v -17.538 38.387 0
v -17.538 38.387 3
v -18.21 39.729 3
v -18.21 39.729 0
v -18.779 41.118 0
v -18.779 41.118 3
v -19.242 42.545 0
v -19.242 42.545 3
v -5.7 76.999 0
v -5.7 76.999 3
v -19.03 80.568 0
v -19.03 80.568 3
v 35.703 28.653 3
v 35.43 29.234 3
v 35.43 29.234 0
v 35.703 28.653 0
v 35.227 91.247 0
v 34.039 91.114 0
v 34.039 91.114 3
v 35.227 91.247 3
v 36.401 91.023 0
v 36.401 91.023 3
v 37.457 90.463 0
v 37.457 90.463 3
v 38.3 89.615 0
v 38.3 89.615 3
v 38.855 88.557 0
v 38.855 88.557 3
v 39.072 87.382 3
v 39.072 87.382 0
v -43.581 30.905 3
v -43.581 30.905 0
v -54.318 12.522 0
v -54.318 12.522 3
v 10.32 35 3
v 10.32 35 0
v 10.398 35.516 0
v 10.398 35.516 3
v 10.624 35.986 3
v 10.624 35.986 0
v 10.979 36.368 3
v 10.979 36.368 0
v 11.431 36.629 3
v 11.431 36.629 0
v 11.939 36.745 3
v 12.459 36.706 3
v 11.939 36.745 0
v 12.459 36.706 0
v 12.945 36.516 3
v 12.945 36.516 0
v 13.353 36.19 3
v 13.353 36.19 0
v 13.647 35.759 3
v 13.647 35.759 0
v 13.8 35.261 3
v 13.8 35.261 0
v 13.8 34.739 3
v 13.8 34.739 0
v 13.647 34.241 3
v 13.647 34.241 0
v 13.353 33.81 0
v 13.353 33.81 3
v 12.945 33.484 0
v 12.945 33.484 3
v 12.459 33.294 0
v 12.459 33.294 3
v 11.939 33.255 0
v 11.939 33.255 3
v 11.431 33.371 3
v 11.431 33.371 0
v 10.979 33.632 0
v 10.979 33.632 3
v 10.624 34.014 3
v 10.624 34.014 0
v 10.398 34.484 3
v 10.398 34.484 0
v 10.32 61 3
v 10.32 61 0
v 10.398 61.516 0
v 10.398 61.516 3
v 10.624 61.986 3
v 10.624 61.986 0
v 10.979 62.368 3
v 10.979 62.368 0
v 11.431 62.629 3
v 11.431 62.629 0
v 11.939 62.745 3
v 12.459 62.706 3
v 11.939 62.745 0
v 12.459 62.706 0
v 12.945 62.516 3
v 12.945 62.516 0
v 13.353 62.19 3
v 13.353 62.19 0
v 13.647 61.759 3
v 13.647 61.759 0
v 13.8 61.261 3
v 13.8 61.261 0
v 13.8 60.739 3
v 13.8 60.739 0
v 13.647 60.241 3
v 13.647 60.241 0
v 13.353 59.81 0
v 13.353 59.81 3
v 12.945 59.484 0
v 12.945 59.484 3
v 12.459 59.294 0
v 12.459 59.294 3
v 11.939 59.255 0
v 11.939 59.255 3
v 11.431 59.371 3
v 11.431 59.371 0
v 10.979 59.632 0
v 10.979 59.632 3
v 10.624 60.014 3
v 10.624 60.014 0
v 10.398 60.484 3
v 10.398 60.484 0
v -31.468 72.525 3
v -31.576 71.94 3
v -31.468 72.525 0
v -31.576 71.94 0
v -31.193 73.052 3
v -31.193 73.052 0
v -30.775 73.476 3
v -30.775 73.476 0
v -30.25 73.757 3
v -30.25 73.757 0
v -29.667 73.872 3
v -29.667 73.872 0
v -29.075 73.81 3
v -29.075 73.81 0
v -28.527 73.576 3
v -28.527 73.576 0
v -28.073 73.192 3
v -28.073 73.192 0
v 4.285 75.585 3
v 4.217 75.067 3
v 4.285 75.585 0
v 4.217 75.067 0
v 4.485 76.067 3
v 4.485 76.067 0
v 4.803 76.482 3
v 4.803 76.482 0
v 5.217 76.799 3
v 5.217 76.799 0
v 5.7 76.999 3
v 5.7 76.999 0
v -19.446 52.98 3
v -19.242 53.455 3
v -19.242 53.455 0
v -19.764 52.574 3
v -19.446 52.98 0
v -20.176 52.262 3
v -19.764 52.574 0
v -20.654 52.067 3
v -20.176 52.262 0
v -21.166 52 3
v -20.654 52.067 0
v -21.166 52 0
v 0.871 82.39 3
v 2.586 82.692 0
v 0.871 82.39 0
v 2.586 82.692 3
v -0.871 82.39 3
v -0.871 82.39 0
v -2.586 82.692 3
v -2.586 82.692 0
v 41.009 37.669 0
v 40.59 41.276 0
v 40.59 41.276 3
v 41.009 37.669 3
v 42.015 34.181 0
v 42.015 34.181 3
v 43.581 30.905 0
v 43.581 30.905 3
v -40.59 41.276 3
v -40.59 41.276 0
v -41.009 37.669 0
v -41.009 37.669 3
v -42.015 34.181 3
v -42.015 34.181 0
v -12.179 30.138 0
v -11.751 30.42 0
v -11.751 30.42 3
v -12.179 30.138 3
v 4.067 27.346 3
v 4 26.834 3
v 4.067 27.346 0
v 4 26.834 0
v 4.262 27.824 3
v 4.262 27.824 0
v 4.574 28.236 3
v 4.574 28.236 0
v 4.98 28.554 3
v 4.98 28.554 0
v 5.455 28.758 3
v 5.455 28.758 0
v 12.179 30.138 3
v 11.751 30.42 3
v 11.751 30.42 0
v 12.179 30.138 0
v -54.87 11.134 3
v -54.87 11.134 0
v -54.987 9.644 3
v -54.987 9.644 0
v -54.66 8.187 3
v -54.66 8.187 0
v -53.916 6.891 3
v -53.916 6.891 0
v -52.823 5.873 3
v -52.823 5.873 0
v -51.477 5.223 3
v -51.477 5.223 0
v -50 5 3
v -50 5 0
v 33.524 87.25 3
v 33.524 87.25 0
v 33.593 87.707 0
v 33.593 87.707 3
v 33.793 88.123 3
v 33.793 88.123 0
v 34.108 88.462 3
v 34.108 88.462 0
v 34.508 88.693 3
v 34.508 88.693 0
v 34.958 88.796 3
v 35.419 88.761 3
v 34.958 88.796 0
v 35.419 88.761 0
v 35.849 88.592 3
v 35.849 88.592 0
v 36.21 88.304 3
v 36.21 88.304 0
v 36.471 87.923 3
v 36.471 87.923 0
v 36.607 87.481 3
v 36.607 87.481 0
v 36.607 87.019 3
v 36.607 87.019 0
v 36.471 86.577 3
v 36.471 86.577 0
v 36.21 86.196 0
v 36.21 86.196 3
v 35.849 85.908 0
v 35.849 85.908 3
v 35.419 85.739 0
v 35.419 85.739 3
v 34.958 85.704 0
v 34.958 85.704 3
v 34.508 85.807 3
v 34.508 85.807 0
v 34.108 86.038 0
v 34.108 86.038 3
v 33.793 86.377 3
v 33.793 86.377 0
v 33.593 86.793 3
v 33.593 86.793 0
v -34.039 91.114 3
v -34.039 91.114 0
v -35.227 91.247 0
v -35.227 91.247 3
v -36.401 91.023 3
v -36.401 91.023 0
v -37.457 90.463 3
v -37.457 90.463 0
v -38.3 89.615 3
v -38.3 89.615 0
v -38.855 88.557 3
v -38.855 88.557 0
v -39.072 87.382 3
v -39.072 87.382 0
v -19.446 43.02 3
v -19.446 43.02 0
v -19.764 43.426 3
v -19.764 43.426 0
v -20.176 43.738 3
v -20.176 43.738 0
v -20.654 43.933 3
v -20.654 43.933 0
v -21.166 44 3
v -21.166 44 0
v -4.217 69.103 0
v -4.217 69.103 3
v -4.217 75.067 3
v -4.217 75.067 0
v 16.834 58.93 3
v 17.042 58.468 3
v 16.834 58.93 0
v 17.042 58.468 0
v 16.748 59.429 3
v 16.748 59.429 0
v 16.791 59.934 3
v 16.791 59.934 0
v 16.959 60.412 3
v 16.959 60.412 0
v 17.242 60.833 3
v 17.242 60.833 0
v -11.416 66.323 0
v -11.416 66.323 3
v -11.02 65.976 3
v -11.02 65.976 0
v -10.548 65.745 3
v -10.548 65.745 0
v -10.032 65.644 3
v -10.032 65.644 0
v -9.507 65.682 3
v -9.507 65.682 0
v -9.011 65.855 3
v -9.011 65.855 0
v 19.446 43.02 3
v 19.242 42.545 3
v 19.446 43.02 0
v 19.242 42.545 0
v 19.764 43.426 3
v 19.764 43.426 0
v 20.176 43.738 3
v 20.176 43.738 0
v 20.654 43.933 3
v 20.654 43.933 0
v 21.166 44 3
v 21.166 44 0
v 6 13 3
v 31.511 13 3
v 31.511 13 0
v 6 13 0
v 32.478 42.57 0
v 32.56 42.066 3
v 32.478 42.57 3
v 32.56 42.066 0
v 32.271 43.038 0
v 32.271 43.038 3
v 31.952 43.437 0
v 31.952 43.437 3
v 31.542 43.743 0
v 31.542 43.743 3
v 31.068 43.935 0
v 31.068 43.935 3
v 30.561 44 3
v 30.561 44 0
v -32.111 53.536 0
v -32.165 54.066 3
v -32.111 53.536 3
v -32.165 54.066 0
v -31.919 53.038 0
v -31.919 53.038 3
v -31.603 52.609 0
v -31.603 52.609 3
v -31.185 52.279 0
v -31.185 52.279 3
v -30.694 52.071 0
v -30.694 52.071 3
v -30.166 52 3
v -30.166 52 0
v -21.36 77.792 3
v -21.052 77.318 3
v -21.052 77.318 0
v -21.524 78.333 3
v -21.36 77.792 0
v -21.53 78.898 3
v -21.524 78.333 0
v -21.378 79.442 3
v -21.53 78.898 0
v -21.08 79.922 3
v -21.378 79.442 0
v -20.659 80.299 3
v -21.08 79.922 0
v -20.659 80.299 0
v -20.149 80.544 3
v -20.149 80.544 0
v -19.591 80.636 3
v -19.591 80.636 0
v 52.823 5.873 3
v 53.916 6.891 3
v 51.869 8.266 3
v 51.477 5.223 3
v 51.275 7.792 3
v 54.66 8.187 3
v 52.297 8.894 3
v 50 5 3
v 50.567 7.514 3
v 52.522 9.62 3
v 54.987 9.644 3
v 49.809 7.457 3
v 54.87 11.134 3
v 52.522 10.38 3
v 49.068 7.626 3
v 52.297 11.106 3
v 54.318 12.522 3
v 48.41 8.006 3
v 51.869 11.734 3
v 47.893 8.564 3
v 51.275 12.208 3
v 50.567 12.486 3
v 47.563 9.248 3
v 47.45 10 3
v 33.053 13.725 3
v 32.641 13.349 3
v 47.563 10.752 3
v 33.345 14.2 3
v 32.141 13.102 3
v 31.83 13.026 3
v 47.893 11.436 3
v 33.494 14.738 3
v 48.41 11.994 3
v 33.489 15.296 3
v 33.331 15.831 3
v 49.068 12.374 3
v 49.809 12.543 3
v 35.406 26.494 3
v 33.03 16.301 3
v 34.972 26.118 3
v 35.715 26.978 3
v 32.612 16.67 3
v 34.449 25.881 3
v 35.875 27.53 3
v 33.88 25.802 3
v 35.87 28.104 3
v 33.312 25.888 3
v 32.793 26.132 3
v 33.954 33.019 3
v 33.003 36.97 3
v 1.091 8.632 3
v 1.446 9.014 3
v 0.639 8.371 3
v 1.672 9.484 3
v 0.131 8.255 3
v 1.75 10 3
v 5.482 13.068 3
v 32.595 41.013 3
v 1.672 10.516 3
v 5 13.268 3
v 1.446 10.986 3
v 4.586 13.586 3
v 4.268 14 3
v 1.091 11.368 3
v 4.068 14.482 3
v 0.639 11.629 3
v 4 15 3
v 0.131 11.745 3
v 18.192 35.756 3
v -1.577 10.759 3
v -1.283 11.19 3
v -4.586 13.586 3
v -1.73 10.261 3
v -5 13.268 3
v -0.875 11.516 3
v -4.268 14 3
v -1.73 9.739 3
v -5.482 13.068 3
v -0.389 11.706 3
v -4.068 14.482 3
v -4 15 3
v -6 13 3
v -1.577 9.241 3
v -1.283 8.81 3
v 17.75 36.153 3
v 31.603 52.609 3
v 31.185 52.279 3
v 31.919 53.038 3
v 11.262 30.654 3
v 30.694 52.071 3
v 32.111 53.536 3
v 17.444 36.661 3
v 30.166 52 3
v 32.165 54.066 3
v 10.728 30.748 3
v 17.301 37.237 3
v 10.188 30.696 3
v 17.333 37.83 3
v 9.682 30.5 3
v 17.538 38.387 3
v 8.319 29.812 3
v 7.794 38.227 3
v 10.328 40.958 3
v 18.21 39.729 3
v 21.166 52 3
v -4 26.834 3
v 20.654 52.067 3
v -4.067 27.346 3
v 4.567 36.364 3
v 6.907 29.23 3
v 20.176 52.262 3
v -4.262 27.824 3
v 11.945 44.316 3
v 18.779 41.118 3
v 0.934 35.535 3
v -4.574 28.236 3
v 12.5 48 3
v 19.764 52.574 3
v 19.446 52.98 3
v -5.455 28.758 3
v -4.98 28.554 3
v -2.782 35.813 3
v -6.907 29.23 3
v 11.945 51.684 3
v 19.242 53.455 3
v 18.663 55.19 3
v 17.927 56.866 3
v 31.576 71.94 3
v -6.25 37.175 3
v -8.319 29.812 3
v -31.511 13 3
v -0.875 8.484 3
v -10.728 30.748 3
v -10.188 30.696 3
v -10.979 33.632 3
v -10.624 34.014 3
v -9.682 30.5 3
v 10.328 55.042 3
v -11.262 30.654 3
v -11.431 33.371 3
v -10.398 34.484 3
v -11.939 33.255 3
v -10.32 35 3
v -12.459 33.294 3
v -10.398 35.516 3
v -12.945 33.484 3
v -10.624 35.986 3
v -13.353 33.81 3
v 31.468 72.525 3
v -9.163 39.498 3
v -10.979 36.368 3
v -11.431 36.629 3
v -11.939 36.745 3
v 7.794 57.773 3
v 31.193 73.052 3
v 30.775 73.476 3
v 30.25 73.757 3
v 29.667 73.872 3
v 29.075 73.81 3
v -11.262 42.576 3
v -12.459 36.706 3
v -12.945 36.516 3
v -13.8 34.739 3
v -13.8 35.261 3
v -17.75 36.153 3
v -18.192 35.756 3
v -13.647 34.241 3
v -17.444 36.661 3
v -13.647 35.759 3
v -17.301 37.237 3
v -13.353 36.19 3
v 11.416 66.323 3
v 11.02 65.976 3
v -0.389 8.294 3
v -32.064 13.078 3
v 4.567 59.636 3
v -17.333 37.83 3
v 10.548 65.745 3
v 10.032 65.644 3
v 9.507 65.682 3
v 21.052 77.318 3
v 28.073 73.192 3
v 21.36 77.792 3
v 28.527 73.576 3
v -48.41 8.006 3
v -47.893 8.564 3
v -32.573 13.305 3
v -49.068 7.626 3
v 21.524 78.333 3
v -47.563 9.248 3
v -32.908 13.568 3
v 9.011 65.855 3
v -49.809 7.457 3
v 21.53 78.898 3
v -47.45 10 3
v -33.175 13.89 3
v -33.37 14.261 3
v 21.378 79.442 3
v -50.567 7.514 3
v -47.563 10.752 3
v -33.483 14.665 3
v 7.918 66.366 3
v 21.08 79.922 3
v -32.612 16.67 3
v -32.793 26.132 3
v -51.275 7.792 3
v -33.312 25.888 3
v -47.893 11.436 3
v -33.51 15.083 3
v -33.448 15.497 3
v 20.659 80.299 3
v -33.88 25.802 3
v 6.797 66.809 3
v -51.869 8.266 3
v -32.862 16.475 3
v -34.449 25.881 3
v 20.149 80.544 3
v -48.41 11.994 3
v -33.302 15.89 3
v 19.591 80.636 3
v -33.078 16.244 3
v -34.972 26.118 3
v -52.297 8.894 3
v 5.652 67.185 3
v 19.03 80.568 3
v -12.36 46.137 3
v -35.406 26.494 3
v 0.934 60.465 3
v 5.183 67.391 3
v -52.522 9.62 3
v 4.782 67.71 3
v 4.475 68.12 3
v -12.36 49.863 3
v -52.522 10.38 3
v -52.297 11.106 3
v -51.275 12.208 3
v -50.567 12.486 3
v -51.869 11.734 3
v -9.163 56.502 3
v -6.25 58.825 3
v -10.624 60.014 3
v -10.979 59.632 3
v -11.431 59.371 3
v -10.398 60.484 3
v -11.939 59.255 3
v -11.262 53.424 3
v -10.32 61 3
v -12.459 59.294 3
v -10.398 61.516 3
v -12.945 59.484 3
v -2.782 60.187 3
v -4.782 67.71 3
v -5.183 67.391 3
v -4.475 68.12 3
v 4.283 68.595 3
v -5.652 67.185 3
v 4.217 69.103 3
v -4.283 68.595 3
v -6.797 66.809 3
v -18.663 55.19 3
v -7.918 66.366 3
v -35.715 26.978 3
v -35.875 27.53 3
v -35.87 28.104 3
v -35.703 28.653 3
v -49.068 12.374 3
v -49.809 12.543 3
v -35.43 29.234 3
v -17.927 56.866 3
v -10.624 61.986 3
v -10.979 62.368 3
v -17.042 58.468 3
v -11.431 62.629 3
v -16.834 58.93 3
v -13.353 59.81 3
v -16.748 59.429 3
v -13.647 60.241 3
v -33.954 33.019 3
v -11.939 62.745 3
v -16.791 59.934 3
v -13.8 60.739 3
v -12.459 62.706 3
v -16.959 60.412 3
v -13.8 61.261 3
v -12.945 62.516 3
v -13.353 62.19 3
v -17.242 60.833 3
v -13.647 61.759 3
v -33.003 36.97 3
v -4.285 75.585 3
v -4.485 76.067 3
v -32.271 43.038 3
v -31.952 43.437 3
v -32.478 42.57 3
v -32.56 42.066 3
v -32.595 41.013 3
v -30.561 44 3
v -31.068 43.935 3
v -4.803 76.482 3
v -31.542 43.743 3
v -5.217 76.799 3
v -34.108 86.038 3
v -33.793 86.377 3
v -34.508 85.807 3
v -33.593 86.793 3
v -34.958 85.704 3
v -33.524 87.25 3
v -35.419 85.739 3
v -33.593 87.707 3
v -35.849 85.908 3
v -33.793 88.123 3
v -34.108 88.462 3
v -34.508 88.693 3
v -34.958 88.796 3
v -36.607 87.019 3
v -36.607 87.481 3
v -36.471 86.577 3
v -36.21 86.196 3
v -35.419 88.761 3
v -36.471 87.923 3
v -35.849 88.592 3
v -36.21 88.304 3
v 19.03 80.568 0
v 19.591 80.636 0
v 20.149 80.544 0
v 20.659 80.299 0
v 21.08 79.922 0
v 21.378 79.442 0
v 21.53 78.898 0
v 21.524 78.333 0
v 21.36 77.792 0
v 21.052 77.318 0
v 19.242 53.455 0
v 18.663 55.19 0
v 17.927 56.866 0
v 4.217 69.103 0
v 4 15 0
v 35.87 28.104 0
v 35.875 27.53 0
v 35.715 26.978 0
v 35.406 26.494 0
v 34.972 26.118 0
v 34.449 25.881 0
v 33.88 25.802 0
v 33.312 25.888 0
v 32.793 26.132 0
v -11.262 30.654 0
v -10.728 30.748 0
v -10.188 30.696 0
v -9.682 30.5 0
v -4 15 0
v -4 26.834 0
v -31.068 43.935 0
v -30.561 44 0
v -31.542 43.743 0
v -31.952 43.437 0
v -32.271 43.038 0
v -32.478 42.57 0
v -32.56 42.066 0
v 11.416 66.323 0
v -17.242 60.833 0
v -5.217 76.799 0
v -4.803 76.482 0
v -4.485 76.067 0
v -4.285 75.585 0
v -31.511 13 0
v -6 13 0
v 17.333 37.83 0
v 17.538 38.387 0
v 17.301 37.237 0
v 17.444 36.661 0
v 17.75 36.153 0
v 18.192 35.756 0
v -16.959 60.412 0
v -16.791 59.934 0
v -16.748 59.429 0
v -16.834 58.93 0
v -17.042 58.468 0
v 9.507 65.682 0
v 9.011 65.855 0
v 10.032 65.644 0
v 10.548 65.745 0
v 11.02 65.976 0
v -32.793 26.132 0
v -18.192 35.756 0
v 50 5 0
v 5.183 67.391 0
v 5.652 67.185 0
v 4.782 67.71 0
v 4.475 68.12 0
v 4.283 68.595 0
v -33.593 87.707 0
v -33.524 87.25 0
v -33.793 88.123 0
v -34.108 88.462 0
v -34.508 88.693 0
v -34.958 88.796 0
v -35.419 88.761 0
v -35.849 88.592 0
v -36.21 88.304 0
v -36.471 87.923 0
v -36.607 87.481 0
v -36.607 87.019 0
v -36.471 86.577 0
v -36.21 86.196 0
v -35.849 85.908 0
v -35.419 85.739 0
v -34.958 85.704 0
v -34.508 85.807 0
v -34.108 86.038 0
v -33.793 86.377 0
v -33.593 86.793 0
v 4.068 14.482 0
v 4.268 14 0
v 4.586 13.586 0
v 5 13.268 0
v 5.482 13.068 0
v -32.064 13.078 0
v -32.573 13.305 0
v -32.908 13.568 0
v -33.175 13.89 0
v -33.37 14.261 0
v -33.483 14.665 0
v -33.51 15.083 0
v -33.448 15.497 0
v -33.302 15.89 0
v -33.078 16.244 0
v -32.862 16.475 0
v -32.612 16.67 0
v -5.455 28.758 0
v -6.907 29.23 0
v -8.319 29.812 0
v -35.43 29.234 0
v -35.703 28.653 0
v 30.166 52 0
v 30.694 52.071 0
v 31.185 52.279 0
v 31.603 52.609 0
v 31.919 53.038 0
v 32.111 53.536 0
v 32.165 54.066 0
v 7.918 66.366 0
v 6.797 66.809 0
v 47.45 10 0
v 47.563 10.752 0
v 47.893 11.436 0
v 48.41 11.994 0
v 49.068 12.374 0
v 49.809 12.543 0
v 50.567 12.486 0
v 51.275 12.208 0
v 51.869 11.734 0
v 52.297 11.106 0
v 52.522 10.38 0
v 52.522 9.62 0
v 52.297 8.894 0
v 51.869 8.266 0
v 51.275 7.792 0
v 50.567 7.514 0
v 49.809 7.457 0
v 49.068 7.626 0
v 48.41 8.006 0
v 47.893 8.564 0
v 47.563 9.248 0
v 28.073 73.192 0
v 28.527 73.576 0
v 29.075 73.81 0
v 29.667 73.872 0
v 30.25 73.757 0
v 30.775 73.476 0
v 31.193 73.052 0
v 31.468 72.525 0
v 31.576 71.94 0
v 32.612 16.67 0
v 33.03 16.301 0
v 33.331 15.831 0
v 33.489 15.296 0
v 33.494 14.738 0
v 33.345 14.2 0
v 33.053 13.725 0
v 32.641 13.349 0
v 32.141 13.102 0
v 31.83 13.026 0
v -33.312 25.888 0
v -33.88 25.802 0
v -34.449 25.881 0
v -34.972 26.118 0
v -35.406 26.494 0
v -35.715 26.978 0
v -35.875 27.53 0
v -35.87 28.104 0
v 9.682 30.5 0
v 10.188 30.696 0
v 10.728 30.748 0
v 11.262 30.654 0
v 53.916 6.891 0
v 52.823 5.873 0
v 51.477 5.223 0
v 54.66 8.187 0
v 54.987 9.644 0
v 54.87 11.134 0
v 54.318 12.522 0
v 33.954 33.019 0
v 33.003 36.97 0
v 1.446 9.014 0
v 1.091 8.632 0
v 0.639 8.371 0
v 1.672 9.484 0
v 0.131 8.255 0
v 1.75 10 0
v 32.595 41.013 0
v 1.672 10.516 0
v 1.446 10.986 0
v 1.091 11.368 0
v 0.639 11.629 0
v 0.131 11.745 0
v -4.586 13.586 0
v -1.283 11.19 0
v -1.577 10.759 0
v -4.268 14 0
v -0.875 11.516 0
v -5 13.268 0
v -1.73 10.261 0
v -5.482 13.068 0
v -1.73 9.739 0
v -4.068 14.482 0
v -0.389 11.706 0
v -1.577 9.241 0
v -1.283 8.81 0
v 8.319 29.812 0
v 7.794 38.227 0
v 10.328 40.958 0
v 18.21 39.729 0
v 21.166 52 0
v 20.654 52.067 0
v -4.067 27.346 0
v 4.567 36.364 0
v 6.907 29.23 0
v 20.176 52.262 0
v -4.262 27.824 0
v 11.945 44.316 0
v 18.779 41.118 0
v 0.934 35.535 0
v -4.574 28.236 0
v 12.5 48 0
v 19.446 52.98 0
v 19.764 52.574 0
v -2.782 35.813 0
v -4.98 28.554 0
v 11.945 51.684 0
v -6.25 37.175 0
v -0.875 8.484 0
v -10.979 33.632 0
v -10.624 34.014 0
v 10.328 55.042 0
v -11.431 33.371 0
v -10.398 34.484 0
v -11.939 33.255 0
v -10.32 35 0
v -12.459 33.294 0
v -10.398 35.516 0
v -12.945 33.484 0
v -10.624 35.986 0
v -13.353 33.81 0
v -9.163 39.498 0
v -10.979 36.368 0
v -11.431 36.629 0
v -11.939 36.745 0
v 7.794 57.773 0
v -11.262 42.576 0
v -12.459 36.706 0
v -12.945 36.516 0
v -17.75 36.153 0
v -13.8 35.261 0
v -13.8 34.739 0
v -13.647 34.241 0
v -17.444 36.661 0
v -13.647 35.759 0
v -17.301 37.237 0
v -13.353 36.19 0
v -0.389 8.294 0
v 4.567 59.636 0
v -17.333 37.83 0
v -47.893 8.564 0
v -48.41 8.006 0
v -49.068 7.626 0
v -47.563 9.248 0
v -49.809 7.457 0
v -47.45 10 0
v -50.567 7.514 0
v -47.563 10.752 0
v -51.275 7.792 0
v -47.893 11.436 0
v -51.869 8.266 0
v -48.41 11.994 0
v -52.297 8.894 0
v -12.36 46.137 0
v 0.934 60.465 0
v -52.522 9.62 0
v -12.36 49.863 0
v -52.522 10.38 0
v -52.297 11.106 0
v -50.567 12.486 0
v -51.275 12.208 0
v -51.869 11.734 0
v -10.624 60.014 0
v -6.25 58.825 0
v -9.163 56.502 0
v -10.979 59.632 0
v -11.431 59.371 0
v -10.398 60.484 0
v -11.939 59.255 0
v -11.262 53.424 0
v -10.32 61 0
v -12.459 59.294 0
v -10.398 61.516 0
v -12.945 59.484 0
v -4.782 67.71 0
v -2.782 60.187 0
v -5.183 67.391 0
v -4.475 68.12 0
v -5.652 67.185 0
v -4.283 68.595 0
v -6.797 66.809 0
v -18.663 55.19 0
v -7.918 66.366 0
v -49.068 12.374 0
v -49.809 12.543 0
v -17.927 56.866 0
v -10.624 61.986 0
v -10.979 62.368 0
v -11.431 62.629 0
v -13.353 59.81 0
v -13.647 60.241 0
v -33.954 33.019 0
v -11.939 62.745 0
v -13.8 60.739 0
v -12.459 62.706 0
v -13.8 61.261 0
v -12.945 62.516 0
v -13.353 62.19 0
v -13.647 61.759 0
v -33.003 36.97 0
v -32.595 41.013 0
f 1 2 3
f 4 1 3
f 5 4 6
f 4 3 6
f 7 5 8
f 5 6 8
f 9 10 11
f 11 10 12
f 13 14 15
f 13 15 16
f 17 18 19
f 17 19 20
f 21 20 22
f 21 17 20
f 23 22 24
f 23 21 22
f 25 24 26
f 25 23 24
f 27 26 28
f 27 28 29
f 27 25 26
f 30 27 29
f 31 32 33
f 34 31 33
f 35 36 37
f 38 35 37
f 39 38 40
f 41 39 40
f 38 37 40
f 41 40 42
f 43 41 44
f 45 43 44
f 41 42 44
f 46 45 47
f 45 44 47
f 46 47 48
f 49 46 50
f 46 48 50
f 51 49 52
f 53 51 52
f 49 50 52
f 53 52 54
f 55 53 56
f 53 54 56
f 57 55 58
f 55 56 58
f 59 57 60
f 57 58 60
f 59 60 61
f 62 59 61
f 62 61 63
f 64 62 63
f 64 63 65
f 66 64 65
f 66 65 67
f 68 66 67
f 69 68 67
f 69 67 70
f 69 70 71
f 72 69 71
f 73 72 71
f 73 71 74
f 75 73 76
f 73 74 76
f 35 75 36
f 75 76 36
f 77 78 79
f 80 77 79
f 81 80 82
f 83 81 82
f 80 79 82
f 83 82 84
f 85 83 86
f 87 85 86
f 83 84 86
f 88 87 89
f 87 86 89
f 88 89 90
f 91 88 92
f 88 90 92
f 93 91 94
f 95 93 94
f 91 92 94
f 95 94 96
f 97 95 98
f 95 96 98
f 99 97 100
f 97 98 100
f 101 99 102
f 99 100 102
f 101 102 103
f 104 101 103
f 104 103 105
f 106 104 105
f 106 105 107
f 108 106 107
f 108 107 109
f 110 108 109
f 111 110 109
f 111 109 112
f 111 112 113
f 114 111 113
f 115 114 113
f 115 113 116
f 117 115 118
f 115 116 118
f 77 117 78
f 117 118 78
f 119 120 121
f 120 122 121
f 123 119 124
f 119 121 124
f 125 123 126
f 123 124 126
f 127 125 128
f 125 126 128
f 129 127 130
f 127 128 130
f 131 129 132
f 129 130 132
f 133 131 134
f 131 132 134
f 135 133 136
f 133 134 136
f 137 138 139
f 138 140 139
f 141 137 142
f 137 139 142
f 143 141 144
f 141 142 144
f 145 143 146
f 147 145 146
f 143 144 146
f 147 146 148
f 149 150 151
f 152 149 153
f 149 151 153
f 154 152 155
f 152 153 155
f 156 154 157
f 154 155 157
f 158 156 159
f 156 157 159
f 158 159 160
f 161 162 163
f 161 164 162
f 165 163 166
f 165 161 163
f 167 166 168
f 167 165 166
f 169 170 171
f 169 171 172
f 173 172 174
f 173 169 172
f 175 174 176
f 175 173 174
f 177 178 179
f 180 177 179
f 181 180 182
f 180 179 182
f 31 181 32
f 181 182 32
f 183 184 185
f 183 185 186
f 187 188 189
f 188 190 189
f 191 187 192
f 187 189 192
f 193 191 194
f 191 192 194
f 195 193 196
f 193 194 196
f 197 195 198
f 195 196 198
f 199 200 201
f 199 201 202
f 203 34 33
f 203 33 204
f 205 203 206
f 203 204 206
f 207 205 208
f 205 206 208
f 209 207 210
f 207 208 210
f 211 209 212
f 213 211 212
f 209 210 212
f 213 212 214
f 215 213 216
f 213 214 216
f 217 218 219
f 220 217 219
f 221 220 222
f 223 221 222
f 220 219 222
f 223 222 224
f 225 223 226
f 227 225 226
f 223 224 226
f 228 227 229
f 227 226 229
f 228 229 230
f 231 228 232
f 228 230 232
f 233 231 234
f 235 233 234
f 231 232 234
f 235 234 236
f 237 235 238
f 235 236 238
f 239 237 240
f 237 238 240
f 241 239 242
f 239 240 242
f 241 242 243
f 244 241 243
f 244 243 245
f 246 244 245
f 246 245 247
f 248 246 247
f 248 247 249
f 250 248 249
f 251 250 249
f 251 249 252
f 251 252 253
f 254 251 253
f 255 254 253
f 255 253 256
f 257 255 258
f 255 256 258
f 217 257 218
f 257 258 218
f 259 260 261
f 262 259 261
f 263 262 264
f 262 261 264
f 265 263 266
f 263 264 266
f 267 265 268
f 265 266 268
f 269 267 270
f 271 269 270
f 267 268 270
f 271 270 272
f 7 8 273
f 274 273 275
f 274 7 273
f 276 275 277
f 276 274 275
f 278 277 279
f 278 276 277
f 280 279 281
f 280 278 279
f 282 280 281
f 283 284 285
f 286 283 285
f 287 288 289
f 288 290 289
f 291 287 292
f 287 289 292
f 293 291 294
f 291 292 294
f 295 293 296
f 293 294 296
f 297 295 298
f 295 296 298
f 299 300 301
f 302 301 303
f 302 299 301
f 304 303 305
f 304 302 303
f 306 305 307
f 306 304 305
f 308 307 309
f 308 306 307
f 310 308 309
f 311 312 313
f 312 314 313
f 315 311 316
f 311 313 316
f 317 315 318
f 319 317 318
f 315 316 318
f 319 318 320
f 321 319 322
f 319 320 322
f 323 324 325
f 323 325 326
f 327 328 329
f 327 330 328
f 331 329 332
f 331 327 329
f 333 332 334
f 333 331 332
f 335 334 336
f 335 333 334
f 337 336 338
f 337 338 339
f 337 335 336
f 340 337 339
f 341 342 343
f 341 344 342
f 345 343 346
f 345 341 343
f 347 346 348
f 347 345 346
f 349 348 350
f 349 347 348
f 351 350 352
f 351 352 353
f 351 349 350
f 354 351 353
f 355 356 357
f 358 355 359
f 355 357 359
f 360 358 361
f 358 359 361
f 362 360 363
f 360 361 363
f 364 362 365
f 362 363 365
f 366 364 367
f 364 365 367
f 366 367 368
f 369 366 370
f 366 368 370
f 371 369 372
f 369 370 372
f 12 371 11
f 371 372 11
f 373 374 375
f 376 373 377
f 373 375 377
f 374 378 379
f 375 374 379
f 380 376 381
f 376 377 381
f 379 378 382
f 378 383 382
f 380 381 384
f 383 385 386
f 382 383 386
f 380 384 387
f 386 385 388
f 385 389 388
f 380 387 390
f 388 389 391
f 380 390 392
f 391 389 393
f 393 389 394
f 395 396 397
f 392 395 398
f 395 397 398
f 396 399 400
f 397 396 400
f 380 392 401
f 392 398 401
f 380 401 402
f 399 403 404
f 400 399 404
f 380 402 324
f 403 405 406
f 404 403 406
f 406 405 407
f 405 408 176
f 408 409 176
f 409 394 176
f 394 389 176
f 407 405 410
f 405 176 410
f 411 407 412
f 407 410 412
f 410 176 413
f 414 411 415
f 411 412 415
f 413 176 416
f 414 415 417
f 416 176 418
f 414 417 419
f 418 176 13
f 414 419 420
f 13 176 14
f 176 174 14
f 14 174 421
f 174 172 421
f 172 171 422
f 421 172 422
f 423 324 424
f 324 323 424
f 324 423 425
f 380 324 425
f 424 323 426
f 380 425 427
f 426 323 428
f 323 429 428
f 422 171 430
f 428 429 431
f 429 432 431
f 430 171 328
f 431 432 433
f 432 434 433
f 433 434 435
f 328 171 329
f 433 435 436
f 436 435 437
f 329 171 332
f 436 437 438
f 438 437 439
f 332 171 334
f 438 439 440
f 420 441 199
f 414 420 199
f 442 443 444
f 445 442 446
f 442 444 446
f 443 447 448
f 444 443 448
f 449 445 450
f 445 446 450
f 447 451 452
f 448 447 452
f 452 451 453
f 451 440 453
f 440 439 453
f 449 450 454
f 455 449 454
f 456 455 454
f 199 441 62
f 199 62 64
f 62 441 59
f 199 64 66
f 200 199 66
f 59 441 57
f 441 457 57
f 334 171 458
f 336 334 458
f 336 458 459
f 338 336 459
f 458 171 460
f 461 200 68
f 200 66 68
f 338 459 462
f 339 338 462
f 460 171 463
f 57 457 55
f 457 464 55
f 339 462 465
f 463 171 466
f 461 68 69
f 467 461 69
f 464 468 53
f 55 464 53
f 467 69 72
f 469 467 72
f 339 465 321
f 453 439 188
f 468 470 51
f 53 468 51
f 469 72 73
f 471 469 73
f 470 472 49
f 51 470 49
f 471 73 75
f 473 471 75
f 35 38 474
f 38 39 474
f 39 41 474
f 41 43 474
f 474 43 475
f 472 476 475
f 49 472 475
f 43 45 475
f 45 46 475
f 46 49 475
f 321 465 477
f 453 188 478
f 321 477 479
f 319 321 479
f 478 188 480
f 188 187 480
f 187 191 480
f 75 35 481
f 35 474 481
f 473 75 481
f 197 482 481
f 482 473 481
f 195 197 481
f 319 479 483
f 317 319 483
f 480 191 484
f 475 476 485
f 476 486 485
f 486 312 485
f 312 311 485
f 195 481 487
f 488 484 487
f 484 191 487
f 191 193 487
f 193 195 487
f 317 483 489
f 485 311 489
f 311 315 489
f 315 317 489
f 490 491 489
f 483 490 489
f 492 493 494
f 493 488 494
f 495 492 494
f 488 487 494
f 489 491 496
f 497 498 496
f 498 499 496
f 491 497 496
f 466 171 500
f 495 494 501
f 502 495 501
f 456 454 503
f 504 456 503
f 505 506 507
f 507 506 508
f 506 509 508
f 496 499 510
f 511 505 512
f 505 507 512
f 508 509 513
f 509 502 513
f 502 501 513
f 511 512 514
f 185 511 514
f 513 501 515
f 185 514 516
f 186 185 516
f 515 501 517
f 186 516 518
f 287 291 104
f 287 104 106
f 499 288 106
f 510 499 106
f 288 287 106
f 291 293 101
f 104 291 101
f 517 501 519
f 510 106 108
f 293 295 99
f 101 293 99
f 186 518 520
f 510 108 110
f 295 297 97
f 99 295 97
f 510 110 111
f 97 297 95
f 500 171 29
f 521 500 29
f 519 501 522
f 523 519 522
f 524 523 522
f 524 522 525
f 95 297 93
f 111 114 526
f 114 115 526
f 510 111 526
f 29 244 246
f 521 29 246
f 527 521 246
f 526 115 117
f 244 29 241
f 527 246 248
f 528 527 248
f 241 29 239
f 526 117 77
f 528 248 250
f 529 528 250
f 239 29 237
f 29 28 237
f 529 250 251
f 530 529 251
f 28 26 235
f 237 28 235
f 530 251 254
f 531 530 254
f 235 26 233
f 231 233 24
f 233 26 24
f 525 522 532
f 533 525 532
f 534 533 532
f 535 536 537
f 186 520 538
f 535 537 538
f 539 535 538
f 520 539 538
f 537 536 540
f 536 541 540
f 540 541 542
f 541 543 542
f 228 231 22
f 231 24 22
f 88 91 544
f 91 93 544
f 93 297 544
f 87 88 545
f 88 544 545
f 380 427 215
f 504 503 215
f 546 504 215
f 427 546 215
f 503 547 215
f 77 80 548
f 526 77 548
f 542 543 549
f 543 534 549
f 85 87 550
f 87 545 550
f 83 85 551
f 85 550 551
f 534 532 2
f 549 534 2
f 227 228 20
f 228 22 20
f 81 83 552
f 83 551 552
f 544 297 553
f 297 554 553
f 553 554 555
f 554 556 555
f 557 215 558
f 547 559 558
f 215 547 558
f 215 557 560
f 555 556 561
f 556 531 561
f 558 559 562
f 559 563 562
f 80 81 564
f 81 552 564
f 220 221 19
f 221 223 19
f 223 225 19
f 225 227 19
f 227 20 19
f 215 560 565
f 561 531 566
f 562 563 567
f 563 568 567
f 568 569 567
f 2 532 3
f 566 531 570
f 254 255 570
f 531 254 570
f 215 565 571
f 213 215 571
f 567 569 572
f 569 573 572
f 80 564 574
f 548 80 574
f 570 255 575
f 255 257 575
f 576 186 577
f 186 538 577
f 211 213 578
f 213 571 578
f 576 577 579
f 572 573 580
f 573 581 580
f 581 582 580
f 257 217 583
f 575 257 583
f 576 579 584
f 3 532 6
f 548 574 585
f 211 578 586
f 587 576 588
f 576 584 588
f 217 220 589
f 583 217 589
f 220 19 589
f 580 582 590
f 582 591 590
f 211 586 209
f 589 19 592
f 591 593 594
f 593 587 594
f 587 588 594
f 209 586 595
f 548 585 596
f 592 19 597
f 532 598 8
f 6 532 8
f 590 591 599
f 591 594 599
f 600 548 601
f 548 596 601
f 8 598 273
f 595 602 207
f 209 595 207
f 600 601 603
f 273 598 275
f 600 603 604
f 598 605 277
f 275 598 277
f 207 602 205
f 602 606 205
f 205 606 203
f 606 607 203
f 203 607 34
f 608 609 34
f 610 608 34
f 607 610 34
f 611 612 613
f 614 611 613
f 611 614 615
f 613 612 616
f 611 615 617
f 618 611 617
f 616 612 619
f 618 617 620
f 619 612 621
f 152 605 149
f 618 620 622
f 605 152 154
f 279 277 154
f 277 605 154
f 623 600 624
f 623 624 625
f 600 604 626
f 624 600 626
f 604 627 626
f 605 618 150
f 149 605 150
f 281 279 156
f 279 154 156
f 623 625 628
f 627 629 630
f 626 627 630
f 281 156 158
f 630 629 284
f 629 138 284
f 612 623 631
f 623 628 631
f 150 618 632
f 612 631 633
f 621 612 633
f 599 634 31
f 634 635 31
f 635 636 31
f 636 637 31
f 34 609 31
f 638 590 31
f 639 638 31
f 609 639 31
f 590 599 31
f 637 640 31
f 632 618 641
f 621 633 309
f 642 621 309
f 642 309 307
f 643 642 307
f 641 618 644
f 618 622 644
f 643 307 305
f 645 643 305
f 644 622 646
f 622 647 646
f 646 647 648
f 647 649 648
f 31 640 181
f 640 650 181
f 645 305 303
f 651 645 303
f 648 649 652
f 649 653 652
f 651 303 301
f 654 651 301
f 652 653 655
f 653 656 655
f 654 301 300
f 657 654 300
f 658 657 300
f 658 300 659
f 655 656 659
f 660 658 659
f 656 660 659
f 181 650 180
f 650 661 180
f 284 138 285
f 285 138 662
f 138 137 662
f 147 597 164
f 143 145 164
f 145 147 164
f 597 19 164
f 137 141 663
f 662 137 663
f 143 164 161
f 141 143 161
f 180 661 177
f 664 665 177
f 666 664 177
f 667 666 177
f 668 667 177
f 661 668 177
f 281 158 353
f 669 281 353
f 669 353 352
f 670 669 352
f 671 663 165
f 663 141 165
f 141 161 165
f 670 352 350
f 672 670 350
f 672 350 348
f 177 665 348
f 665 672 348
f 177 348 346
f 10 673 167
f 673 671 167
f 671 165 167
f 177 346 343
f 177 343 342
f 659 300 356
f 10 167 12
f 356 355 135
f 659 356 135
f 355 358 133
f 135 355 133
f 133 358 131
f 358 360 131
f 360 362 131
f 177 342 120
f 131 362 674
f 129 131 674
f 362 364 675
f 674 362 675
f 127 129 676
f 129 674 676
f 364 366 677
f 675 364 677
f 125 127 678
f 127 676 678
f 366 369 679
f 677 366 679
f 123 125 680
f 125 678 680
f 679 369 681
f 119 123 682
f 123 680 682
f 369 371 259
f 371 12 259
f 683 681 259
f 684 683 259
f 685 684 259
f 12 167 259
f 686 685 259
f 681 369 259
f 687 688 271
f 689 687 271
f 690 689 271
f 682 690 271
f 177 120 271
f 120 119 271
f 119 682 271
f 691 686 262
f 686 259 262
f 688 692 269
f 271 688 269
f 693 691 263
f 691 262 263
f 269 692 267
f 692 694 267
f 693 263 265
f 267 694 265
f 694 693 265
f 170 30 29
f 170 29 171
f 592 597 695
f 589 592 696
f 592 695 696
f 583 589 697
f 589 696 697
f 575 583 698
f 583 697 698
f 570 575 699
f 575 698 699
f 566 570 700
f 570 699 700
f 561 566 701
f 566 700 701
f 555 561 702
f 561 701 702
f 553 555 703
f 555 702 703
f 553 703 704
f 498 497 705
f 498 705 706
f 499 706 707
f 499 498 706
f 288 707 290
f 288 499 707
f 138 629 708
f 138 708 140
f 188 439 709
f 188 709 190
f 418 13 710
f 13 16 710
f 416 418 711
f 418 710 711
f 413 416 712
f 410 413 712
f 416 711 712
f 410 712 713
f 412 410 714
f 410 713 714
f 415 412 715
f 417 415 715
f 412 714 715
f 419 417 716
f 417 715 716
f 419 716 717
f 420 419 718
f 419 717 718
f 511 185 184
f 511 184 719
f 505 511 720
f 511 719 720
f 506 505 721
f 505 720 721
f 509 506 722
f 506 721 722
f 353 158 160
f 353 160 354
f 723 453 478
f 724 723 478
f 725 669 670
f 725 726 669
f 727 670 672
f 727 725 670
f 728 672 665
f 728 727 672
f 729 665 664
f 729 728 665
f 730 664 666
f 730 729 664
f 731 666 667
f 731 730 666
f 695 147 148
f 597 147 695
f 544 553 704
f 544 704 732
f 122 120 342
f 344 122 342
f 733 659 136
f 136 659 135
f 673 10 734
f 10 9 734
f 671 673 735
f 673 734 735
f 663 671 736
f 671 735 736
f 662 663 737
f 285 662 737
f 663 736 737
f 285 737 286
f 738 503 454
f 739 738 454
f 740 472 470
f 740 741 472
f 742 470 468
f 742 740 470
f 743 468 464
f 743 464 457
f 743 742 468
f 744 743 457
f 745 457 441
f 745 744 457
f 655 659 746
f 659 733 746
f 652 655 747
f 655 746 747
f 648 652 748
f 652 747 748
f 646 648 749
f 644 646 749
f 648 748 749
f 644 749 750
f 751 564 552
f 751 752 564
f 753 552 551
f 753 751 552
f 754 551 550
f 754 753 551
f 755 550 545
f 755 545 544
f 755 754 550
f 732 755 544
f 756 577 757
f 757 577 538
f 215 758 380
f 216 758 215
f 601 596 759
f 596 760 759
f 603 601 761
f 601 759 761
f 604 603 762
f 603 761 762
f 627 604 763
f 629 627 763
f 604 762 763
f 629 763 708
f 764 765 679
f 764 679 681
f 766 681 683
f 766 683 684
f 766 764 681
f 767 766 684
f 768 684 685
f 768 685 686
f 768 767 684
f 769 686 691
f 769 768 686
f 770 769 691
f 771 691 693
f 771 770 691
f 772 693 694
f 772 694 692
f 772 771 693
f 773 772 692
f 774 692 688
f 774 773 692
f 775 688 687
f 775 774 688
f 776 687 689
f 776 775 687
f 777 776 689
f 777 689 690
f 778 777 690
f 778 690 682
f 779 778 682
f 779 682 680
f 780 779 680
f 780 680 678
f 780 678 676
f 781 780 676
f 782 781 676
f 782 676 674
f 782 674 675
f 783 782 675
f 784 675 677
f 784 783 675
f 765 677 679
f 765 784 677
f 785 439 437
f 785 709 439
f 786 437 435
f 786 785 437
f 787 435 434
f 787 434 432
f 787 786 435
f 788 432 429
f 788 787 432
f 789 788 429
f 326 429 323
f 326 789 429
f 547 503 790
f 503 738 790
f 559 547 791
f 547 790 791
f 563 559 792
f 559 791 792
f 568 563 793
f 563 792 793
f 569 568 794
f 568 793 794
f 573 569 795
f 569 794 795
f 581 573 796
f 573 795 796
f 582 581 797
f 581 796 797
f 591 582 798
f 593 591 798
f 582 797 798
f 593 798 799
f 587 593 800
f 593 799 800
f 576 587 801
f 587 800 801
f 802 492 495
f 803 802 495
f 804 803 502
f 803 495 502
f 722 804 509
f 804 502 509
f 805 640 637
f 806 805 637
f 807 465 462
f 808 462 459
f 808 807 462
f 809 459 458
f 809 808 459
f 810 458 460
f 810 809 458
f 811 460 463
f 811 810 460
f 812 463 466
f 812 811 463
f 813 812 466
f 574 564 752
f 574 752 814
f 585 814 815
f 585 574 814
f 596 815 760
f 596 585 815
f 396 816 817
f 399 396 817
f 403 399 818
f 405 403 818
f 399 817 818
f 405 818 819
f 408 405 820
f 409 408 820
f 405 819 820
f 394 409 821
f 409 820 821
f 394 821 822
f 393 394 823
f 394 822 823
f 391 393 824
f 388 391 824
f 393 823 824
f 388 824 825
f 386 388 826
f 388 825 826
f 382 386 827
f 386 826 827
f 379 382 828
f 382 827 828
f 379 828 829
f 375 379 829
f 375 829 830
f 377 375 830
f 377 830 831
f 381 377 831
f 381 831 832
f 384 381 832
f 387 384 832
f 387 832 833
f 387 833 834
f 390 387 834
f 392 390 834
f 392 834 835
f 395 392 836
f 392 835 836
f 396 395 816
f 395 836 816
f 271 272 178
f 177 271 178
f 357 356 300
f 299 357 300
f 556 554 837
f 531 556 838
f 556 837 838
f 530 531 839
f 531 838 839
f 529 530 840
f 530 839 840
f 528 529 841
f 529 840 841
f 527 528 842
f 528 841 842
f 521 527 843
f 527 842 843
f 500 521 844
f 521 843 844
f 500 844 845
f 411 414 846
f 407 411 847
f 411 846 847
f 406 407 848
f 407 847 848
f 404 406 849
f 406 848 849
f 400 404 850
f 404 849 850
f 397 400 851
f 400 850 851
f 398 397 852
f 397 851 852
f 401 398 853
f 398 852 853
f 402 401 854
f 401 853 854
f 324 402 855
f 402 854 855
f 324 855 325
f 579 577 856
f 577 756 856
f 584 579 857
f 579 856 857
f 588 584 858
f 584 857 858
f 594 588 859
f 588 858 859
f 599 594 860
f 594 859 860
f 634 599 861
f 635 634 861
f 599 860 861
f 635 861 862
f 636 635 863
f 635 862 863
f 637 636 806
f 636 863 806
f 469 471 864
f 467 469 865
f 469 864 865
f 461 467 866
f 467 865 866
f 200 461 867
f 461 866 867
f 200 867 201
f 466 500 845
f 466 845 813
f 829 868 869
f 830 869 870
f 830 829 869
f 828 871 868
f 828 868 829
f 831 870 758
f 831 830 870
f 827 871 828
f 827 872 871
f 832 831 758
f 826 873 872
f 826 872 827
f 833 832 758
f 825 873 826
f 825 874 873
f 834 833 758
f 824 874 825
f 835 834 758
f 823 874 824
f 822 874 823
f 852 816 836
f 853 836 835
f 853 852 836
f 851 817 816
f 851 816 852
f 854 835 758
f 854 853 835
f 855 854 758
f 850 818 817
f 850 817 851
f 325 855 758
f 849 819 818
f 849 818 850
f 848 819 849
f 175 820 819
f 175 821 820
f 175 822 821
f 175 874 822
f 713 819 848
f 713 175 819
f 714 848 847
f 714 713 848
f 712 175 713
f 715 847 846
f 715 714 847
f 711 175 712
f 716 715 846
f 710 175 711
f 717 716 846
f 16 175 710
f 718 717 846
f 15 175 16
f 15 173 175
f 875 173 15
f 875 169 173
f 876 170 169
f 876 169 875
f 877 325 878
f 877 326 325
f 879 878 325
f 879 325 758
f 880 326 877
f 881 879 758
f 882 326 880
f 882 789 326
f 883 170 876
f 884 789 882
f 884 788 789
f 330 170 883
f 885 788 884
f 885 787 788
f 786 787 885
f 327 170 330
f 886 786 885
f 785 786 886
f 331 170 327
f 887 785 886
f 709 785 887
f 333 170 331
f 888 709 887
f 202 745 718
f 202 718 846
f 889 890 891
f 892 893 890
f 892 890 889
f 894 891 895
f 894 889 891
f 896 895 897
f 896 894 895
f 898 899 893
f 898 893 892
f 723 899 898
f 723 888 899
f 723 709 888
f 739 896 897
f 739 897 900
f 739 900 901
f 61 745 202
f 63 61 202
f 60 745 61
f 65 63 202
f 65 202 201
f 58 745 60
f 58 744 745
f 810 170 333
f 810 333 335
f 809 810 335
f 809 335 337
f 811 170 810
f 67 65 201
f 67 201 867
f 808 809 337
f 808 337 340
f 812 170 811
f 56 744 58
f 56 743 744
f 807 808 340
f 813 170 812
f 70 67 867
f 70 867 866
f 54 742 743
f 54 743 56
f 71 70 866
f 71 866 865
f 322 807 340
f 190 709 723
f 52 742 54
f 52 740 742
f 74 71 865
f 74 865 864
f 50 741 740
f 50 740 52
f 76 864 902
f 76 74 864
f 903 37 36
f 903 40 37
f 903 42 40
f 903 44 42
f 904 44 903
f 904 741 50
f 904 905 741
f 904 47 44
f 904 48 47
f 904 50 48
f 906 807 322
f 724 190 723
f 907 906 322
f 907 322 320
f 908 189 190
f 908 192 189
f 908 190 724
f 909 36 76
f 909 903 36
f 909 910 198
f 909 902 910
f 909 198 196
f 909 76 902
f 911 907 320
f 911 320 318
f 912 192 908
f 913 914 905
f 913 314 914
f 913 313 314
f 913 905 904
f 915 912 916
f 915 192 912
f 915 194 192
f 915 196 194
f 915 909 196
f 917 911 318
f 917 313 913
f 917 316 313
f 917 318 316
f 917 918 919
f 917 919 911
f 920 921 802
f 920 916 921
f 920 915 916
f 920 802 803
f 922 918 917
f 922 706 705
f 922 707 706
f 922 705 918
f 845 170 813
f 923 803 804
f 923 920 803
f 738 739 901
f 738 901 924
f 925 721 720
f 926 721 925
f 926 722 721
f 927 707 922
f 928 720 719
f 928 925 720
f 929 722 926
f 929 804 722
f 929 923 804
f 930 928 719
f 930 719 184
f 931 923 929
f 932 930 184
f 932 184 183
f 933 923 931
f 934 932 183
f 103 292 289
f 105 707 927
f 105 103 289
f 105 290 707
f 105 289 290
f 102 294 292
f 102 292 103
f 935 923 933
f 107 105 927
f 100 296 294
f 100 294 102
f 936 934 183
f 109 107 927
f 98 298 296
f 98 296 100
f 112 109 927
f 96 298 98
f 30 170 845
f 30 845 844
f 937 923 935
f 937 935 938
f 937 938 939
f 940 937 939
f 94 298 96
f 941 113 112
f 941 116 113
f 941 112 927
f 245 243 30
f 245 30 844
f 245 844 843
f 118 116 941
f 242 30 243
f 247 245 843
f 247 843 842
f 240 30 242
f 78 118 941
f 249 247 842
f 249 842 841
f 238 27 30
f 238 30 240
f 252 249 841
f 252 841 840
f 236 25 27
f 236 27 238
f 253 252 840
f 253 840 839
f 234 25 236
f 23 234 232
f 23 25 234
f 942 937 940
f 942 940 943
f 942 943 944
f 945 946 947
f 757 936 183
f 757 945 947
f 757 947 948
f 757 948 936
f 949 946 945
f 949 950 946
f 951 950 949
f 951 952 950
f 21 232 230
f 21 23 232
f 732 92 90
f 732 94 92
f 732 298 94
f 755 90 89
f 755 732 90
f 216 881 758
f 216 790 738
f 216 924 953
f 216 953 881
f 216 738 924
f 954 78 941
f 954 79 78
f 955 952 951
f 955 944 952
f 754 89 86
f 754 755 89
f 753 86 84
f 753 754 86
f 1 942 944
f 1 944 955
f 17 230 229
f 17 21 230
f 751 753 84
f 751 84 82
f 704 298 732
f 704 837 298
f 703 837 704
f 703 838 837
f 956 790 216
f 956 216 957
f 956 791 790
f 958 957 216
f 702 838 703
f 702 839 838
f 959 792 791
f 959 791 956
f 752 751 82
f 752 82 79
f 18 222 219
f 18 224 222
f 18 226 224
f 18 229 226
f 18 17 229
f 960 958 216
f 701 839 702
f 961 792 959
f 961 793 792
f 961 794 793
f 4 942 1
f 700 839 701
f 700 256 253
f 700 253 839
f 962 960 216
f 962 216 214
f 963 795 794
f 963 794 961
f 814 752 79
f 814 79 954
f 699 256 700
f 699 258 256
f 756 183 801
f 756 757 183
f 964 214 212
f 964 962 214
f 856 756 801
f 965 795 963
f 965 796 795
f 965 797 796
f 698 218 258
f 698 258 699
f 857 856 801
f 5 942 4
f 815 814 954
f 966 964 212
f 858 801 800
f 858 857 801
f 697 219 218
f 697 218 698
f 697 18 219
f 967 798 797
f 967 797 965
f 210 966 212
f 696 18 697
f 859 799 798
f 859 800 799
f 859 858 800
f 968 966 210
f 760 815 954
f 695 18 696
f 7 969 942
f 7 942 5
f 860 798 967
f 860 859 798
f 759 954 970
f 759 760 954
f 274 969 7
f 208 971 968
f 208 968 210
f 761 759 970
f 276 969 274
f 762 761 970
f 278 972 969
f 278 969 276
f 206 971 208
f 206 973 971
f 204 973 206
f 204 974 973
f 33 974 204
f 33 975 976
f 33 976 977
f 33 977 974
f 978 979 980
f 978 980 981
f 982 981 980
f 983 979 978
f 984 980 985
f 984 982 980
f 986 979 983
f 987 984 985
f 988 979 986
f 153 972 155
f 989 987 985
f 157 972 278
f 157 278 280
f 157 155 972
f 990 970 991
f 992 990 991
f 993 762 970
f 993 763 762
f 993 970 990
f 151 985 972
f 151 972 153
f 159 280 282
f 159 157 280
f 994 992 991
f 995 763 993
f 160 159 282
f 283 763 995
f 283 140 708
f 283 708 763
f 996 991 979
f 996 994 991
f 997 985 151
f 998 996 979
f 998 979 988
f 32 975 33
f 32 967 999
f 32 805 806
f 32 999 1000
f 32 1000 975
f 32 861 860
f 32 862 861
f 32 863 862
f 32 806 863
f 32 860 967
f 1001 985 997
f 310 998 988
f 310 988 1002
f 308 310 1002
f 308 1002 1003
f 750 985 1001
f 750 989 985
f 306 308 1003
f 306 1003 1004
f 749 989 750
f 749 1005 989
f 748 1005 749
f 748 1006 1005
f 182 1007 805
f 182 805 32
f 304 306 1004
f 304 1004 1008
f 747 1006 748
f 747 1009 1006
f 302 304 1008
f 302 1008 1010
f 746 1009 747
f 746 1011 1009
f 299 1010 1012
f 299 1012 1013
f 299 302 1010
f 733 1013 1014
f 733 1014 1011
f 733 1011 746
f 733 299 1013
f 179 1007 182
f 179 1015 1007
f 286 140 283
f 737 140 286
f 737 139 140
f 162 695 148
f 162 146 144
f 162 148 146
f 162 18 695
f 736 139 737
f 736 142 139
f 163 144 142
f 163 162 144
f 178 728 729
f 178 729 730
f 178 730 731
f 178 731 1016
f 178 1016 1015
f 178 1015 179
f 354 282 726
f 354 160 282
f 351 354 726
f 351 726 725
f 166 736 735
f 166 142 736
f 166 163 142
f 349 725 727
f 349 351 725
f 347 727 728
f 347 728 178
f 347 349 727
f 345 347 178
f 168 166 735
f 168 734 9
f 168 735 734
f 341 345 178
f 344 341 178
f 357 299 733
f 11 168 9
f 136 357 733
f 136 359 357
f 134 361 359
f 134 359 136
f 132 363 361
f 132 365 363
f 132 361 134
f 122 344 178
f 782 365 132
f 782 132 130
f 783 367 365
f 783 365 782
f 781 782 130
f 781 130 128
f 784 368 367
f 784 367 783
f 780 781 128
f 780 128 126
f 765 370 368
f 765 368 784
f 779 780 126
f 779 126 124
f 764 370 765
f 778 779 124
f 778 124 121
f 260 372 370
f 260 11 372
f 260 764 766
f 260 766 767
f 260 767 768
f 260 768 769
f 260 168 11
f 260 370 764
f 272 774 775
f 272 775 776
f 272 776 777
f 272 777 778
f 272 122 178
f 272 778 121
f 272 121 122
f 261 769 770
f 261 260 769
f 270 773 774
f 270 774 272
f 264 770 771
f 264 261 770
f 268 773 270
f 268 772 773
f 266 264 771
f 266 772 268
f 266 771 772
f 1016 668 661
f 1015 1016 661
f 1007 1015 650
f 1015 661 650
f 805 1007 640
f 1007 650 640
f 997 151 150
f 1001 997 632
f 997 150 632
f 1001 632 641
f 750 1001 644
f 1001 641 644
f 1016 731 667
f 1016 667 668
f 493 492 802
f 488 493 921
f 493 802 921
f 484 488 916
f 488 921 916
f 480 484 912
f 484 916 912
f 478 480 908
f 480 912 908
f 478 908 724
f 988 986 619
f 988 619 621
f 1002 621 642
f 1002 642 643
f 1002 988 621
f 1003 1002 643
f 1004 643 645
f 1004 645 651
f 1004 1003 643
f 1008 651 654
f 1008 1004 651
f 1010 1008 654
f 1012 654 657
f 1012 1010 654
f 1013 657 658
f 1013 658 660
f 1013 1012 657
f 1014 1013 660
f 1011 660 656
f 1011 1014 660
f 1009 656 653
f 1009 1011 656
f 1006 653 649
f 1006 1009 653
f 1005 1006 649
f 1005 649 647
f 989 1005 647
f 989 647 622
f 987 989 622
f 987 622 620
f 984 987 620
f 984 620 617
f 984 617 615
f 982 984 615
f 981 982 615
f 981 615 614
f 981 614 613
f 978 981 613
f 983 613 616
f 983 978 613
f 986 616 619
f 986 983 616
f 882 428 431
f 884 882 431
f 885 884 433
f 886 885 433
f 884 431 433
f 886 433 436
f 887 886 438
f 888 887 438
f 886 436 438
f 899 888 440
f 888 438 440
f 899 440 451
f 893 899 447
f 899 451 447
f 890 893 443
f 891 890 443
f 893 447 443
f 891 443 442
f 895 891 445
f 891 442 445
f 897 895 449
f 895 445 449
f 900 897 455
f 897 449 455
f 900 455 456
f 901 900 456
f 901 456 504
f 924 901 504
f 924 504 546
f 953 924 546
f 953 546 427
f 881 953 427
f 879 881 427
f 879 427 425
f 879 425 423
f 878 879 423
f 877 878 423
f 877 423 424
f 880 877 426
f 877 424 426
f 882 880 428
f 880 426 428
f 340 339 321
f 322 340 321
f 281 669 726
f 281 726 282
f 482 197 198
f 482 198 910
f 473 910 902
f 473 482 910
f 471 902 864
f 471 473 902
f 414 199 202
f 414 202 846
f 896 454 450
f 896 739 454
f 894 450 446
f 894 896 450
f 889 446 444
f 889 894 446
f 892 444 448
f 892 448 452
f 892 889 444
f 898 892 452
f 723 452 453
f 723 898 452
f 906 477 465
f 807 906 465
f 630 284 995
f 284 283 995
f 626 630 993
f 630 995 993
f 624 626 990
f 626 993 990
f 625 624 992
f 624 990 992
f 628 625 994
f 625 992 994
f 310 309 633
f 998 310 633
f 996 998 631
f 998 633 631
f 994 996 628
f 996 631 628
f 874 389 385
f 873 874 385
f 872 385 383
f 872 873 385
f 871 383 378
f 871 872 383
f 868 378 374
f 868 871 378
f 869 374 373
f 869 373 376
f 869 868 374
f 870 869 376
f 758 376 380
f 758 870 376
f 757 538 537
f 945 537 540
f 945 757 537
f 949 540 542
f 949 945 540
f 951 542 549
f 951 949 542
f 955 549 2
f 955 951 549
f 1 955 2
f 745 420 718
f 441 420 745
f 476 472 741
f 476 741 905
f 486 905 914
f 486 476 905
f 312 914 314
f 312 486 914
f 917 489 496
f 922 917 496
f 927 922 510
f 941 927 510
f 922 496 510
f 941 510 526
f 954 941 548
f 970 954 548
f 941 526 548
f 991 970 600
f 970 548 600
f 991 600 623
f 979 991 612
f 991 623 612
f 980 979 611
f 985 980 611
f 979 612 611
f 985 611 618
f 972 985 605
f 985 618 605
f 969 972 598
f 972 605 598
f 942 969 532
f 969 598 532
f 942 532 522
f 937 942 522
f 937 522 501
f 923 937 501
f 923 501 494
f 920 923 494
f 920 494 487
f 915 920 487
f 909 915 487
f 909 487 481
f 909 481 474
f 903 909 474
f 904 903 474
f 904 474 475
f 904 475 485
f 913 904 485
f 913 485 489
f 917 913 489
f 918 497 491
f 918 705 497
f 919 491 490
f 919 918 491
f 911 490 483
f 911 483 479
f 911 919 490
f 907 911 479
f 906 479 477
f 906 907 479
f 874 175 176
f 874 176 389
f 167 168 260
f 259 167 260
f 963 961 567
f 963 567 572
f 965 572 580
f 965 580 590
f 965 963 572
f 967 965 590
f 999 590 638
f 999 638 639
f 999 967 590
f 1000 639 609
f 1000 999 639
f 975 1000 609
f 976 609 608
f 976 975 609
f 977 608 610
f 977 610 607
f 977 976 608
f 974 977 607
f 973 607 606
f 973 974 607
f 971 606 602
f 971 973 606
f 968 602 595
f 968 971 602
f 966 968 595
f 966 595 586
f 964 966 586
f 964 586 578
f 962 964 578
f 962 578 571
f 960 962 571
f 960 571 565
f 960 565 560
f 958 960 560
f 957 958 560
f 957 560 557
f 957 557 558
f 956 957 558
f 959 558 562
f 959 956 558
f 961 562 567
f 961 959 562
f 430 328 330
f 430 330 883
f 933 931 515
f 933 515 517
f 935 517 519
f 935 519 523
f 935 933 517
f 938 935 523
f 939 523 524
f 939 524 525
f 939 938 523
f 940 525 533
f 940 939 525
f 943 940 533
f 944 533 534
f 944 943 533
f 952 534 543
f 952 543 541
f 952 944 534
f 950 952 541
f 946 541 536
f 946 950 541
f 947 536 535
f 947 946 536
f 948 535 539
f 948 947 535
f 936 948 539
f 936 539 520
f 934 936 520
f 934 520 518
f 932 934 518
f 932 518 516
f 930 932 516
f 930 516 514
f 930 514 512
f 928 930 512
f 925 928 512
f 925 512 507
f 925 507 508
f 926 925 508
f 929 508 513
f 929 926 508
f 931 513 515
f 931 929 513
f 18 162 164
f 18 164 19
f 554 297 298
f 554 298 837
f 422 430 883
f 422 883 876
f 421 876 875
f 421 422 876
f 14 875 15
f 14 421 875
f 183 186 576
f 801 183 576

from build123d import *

# Parameters (mm, degrees)
SKETCH_1_R             = 1.75
SKETCH_1_R_2           = 4
SKETCH_1_R_3           = 1.55
SKETCH_1_R_4           = 5
SKETCH_1_R_5           = 2.55
EXTRUDE_1_DEPTH        = 3
FILLET_1_R             = 10
SKETCH_2_R             = 1.75
CUT_EXTRUDE_1_DEPTH    = 3
CUT_EXTRUDE_2_DEPTH    = 10
FILLET_2_R             = 2
FILLET_2_OF_MIRROR_2_R = 2
SKETCH_5_R             = 12.5
CUT_EXTRUDE_3_DEPTH    = 10
EXTRUDE_2_DEPTH        = 3
FILLET_3_R             = 2
FILLET_4_R             = 2


with BuildPart() as part:
    # 草图1 → 凸台-拉伸1 (new body)
    # profile 1 of 3: a face of its own
    with BuildSketch(Plane.XY):
        with BuildLine():
            ThreePointArc((-31.074028853, 87.25), (-35.139866152, 83.250541855), (-39.071861578, 87.38165676))
            Line((-39.071861578, 87.38165676), (-40.590218292, 41.27588782))
            ThreePointArc((-40.590218292, 41.27588782), (-41.439715326, 35.904074252), (-43.581025503, 30.904792609))
            Line((-43.581025503, 30.904792609), (-54.317561995, 12.521638043))
            ThreePointArc((-54.317561995, 12.521638043), (-48.693824279, 14.826375968), (-45, 10))
            ThreePointArc((-45, 10), (-46.464466094, 6.464466094), (-50, 5))
            Line((-50, 5), (0, 5))
            Line((0, 5), (0, 82))
            Line((0, 82), (-34.039489079, 91.113900549))
            ThreePointArc((-34.039489079, 91.113900549), (-31.900847556, 89.685348117), (-31.074028853, 87.25))
        make_face()
        with Locations((-12.07, 35)):
            Circle(SKETCH_1_R, mode=Mode.SUBTRACT)
        with Locations((-12.07, 61)):
            Circle(SKETCH_1_R, mode=Mode.SUBTRACT)
    # profile 2 of 3: a face of its own
    with BuildSketch(Plane.XY):
        with Locations((-35.074028853, 87.25)):
            Circle(SKETCH_1_R_2)
        with Locations((-35.074028853, 87.25)):
            Circle(SKETCH_1_R_3, mode=Mode.SUBTRACT)
    # profile 3 of 3: a face of its own
    with BuildSketch(Plane.XY):
        with Locations((-50, 10)):
            Circle(SKETCH_1_R_4)
        with Locations((-50, 10)):
            Circle(SKETCH_1_R_5, mode=Mode.SUBTRACT)
    extrude_1 = extrude(amount=EXTRUDE_1_DEPTH)

    # 镜向1: 凸台-拉伸1 across plane
    add(extrude_1.mirror(Plane(origin=(0, 0, 3), x_dir=(0, 0, 1), z_dir=(-1, 0, 0))))

    # 圆角1
    fillet_1_edges = [part.edges().sort_by_distance(p)[0] for p in [
        (0, 82, 1.5),
    ]]
    fillet(fillet_1_edges, radius=FILLET_1_R)

    # 草图2 → 切除-拉伸1 (cut)
    with BuildSketch(Plane.XY.offset(3)):
        with Locations((0, 10)):
            Circle(SKETCH_2_R)
    extrude(amount=-CUT_EXTRUDE_1_DEPTH, mode=Mode.SUBTRACT)

    # 草图4 → 切除-拉伸2 (cut)
    with BuildSketch(Plane.XY.offset(3)):
        with BuildLine():
            ThreePointArc((-10.354163178, 65.111145633), (-7.386964112, 66.58582151), (-4.21701247, 67.550365875))
            Line((-4.21701247, 67.550365875), (-4.21701247, 76.60212181))
            Line((-4.21701247, 76.60212181), (-25.392834673, 82.271840799))
            Line((-25.392834673, 82.271840799), (-10.354163178, 65.111145633))
        make_face()
        with BuildLine():
            ThreePointArc((-16.581442579, 36.817166638), (-19.997686263, 48.304210684), (-16.233615619, 59.682025678))
            Line((-16.233615619, 59.682025678), (-31.409439241, 76.999225749))
            Line((-31.409439241, 76.999225749), (-32.594552841, 41.0125743))
            ThreePointArc((-32.594552841, 41.0125743), (-33.411565317, 34.978483904), (-35.430174477, 29.233662466))
            Line((-35.430174477, 29.233662466), (-38.728362293, 22.219935083))
            Line((-38.728362293, 22.219935083), (-16.581442579, 36.817166638))
        make_face()
        with BuildLine():
            Line((-4, 13), (-4, 28.404082058))
            ThreePointArc((-4, 28.404082058), (-7.476808875, 29.45013938), (-10.707211367, 31.107527572))
            Line((-10.707211367, 31.107527572), (-12.178851974, 30.137556172))
            Line((-12.178851974, 30.137556172), (-34.325771688, 15.540324618))
            Line((-34.325771688, 15.540324618), (-38.179952199, 13))
            Line((-38.179952199, 13), (-4, 13))
        make_face()
    cut_extrude_2 = extrude(amount=-CUT_EXTRUDE_2_DEPTH, mode=Mode.SUBTRACT)

    # 圆角2
    fillet_2_edges = [part.edges().sort_by_distance(p)[0] for p in [
        (-31.409439241, 76.999225749, 1.5),
        (-16.233615619, 59.682025678, 1.5),
        (-16.581442579, 36.817166638, 1.5),
        (-38.728362293, 22.219935083, 1.5),
        (-10.707211367, 31.107527572, 1.5),
        (-4, 28.404082058, 1.5),
        (-4, 13, 1.5),
        (-38.179952199, 13, 1.5),
        (-4.21701247, 67.550365875, 1.5),
        (-10.354163178, 65.111145633, 1.5),
        (-25.392834673, 82.271840799, 1.5),
        (-4.21701247, 76.60212181, 1.5),
    ]]
    fillet(fillet_2_edges, radius=FILLET_2_R)

    # 镜向2: 切除-拉伸2 across plane
    add(cut_extrude_2.mirror(Plane(origin=(0, 0, 0), x_dir=(0, 0, 1), z_dir=(1, 0, 0))), mode=Mode.SUBTRACT)

    # 圆角2 of 镜向2
    fillet_2_of_mirror_2_edges = [part.edges().sort_by_distance(p)[0] for p in [
        (31.409439241, 76.999225749, 1.5),
        (16.233615619, 59.682025678, 1.5),
        (16.581442579, 36.817166638, 1.5),
        (38.728362293, 22.219935083, 1.5),
        (10.707211367, 31.107527572, 1.5),
        (4, 28.404082058, 1.5),
        (4, 13, 1.5),
        (38.179952199, 13, 1.5),
        (4.21701247, 67.550365875, 1.5),
        (10.354163178, 65.111145633, 1.5),
        (25.392834673, 82.271840799, 1.5),
        (4.21701247, 76.60212181, 1.5),
    ]]
    fillet(fillet_2_of_mirror_2_edges, radius=FILLET_2_OF_MIRROR_2_R)

    # 草图5 → 切除-拉伸3 (cut)
    with BuildSketch(Plane.XY.offset(3)):
        with Locations((0, 48)):
            Circle(SKETCH_5_R)
    extrude(amount=-CUT_EXTRUDE_3_DEPTH, mode=Mode.SUBTRACT)

    # 草图6 → 凸台-拉伸2 (add)
    with BuildSketch(Plane.XY.offset(3)):
        with BuildLine():
            Line((-32.364442706, 48), (-20, 48))
            ThreePointArc((-20, 48), (-19.89872306, 50.01017924), (-19.595917942, 52))
            Line((-19.595917942, 52), (-32.232714574, 52))
            Line((-32.232714574, 52), (-32.364442706, 48))
        make_face()
        with BuildLine():
            ThreePointArc((-19.595917942, 44), (-19.89872306, 45.98982076), (-20, 48))
            Line((-20, 48), (-32.364442706, 48))
            Line((-32.364442706, 48), (-32.496170839, 44))
            Line((-32.496170839, 44), (-19.595917942, 44))
        make_face()
    extrude_2 = extrude(amount=-EXTRUDE_2_DEPTH)

    # 镜向3: 凸台-拉伸2 across plane
    add(extrude_2.mirror(Plane(origin=(0, 0, 0), x_dir=(0, 0, 1), z_dir=(1, 0, 0))))

    # 圆角3
    fillet_3_edges = [part.edges().sort_by_distance(p)[0] for p in [
        (-19.595917942, 52, 1.5),
        (-19.595917942, 44, 1.5),
        (-32.496170839, 44, 1.5),
        (-32.232714574, 52, 1.5),
    ]]
    fillet(fillet_3_edges, radius=FILLET_3_R)

    # 圆角4
    fillet_4_edges = [part.edges().sort_by_distance(p)[0] for p in [
        (19.595917942, 44, 1.5),
        (19.595917942, 52, 1.5),
        (32.232714574, 52, 1.5),
        (32.496170839, 44, 1.5),
    ]]
    fillet(fillet_4_edges, radius=FILLET_4_R)


solid = part.part
